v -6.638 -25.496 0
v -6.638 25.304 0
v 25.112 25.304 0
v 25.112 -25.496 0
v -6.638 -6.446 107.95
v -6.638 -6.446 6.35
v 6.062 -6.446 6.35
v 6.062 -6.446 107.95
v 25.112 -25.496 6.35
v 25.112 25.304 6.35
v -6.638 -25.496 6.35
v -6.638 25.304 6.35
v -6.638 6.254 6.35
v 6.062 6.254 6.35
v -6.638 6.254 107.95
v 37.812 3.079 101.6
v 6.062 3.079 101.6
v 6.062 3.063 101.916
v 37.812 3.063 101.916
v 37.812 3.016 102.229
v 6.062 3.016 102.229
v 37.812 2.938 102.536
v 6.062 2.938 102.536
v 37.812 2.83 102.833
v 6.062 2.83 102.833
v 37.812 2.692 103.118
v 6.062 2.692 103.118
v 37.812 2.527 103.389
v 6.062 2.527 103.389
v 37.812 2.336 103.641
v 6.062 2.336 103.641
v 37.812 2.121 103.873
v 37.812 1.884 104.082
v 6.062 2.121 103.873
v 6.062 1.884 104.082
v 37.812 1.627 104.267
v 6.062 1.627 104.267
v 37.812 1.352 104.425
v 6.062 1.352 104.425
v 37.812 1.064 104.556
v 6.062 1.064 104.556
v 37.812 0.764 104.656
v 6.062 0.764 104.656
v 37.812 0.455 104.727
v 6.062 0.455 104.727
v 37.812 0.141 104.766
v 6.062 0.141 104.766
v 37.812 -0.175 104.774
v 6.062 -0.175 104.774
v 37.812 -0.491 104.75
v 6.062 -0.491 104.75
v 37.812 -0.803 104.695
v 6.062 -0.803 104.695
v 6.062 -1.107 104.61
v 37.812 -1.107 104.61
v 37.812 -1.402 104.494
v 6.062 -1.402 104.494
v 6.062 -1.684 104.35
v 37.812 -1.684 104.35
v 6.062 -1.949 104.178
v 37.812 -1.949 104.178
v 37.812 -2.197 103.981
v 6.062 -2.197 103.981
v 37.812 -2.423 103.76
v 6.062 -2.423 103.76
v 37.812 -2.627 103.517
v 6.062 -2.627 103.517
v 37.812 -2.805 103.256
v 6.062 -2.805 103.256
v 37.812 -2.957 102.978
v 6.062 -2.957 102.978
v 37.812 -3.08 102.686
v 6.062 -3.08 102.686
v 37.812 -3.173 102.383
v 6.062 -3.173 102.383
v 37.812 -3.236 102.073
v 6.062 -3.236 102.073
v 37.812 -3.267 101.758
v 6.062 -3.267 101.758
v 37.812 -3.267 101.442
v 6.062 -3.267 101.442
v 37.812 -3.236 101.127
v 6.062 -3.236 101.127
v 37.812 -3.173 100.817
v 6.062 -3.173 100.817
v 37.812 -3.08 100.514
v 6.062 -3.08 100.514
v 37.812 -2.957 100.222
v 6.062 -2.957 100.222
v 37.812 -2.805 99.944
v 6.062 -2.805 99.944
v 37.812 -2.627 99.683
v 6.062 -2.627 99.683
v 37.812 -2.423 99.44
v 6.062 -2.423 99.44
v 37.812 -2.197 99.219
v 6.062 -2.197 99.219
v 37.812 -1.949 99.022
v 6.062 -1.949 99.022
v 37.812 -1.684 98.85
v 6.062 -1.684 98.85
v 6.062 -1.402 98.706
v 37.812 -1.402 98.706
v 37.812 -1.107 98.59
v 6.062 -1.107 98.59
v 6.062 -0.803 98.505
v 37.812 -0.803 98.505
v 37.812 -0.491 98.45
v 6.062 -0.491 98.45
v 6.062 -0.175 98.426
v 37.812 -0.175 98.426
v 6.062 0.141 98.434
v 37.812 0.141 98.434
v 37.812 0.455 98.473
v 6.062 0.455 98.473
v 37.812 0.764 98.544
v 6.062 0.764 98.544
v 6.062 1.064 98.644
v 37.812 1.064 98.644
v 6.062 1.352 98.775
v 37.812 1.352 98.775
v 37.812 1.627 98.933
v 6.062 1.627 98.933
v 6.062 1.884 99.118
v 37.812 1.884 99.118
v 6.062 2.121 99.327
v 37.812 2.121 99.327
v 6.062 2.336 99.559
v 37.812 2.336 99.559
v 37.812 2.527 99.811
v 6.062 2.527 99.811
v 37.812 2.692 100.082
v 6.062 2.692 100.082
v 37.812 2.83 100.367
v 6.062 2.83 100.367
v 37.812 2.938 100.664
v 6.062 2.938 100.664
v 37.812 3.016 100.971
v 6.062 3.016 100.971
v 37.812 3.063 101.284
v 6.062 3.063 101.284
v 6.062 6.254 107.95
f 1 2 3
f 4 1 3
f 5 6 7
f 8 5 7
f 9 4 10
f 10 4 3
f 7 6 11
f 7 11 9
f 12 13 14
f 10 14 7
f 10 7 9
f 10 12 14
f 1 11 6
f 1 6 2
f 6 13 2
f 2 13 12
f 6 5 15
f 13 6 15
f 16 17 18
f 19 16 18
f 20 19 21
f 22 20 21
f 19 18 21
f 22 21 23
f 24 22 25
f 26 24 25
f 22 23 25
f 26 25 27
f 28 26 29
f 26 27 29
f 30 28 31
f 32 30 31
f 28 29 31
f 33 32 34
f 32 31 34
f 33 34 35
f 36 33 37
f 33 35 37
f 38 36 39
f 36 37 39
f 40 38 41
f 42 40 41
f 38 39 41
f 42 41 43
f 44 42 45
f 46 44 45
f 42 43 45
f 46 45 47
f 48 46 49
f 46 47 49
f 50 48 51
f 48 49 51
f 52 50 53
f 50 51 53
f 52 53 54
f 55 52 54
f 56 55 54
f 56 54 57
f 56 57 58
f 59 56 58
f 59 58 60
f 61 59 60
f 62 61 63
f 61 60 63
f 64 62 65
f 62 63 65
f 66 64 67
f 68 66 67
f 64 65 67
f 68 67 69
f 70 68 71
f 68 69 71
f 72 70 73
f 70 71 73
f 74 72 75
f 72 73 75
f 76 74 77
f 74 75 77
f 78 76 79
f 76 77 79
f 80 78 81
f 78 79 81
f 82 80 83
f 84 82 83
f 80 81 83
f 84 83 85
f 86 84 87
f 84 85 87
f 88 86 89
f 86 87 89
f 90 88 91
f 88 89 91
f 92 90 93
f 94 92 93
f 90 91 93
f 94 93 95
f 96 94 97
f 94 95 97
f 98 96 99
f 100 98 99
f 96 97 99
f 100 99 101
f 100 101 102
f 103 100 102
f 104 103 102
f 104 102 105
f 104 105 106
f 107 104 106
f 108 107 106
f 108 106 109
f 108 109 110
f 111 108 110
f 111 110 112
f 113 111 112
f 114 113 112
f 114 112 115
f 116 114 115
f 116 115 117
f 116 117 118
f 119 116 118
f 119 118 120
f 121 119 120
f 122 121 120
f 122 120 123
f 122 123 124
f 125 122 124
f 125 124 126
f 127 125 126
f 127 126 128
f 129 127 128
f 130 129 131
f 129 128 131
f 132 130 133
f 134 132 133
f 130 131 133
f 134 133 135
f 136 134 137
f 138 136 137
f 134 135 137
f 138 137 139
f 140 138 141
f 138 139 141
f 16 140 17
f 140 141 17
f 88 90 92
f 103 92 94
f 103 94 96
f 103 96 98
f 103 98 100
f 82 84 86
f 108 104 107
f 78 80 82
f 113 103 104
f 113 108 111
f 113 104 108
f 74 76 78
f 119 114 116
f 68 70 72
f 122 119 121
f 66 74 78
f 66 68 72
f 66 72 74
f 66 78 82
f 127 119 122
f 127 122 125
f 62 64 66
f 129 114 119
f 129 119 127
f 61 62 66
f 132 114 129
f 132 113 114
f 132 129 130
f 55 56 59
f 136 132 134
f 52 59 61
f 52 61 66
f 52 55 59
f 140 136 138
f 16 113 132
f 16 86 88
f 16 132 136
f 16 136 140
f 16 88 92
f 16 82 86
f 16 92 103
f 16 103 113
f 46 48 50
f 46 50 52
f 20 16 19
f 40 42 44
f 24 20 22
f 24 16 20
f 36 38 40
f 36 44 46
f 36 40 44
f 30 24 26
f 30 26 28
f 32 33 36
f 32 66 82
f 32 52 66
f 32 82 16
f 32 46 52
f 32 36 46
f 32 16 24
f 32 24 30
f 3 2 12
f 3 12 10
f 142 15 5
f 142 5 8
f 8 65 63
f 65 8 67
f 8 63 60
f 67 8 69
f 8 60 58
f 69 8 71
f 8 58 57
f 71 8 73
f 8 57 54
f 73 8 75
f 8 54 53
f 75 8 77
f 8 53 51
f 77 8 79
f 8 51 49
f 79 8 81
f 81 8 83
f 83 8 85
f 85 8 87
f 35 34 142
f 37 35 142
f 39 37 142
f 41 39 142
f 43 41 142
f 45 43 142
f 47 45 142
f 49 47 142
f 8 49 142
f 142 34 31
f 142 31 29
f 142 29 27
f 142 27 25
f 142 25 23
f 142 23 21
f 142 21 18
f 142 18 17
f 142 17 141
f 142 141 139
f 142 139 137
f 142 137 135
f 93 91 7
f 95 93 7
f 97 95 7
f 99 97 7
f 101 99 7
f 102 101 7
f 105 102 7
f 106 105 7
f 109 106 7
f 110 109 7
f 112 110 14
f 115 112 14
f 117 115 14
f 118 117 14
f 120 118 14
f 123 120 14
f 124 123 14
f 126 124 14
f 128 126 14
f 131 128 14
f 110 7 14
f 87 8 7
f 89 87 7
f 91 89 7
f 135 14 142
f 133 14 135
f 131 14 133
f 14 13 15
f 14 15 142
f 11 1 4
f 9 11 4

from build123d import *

# Parameters (mm, degrees)
F0_W     = 50.8
F0_H     = 50.8
F1_DEPTH = 6.35
F2_W     = 12.7
F2_H     = 12.7
F3_DEPTH = 101.6
F4_R     = 3.175
F5_DEPTH = 31.75
F7_DEPTH = 25.4


with BuildPart() as f1:
    # F0 (on Top) → F1 (new body)
    with BuildSketch(Plane.XY):
        with Locations((-0.287808, -0.096031)):
            Rectangle(F0_W, F0_H)
    extrude(amount=F1_DEPTH)

    # F2 (on face) → F3 (join)
    with BuildSketch(Plane.XY.offset(6.35)):
        with Locations((-0.287808, -0.096031)):
            Rectangle(F2_W, F2_H)
    extrude(amount=F3_DEPTH)

    # F4 (on face) → F5 (join)
    with BuildSketch(Plane.YZ.offset(6.062192)):
        with Locations((-0.096031, 101.6)):
            Circle(F4_R)
    extrude(amount=F5_DEPTH)

    # F6 (on face) → F7 (cut)
    with BuildSketch(Plane.XY.offset(6.35)):
        Polygon((-6.637808, -6.446031), (-6.637808, 6.253969), (-6.637808, 25.303969), (-25.687808, 25.303969), (-25.687808, -25.496031), (-6.637808, -25.496031), align=None)
    extrude(amount=-F7_DEPTH, mode=Mode.SUBTRACT)


solid = f1.part
